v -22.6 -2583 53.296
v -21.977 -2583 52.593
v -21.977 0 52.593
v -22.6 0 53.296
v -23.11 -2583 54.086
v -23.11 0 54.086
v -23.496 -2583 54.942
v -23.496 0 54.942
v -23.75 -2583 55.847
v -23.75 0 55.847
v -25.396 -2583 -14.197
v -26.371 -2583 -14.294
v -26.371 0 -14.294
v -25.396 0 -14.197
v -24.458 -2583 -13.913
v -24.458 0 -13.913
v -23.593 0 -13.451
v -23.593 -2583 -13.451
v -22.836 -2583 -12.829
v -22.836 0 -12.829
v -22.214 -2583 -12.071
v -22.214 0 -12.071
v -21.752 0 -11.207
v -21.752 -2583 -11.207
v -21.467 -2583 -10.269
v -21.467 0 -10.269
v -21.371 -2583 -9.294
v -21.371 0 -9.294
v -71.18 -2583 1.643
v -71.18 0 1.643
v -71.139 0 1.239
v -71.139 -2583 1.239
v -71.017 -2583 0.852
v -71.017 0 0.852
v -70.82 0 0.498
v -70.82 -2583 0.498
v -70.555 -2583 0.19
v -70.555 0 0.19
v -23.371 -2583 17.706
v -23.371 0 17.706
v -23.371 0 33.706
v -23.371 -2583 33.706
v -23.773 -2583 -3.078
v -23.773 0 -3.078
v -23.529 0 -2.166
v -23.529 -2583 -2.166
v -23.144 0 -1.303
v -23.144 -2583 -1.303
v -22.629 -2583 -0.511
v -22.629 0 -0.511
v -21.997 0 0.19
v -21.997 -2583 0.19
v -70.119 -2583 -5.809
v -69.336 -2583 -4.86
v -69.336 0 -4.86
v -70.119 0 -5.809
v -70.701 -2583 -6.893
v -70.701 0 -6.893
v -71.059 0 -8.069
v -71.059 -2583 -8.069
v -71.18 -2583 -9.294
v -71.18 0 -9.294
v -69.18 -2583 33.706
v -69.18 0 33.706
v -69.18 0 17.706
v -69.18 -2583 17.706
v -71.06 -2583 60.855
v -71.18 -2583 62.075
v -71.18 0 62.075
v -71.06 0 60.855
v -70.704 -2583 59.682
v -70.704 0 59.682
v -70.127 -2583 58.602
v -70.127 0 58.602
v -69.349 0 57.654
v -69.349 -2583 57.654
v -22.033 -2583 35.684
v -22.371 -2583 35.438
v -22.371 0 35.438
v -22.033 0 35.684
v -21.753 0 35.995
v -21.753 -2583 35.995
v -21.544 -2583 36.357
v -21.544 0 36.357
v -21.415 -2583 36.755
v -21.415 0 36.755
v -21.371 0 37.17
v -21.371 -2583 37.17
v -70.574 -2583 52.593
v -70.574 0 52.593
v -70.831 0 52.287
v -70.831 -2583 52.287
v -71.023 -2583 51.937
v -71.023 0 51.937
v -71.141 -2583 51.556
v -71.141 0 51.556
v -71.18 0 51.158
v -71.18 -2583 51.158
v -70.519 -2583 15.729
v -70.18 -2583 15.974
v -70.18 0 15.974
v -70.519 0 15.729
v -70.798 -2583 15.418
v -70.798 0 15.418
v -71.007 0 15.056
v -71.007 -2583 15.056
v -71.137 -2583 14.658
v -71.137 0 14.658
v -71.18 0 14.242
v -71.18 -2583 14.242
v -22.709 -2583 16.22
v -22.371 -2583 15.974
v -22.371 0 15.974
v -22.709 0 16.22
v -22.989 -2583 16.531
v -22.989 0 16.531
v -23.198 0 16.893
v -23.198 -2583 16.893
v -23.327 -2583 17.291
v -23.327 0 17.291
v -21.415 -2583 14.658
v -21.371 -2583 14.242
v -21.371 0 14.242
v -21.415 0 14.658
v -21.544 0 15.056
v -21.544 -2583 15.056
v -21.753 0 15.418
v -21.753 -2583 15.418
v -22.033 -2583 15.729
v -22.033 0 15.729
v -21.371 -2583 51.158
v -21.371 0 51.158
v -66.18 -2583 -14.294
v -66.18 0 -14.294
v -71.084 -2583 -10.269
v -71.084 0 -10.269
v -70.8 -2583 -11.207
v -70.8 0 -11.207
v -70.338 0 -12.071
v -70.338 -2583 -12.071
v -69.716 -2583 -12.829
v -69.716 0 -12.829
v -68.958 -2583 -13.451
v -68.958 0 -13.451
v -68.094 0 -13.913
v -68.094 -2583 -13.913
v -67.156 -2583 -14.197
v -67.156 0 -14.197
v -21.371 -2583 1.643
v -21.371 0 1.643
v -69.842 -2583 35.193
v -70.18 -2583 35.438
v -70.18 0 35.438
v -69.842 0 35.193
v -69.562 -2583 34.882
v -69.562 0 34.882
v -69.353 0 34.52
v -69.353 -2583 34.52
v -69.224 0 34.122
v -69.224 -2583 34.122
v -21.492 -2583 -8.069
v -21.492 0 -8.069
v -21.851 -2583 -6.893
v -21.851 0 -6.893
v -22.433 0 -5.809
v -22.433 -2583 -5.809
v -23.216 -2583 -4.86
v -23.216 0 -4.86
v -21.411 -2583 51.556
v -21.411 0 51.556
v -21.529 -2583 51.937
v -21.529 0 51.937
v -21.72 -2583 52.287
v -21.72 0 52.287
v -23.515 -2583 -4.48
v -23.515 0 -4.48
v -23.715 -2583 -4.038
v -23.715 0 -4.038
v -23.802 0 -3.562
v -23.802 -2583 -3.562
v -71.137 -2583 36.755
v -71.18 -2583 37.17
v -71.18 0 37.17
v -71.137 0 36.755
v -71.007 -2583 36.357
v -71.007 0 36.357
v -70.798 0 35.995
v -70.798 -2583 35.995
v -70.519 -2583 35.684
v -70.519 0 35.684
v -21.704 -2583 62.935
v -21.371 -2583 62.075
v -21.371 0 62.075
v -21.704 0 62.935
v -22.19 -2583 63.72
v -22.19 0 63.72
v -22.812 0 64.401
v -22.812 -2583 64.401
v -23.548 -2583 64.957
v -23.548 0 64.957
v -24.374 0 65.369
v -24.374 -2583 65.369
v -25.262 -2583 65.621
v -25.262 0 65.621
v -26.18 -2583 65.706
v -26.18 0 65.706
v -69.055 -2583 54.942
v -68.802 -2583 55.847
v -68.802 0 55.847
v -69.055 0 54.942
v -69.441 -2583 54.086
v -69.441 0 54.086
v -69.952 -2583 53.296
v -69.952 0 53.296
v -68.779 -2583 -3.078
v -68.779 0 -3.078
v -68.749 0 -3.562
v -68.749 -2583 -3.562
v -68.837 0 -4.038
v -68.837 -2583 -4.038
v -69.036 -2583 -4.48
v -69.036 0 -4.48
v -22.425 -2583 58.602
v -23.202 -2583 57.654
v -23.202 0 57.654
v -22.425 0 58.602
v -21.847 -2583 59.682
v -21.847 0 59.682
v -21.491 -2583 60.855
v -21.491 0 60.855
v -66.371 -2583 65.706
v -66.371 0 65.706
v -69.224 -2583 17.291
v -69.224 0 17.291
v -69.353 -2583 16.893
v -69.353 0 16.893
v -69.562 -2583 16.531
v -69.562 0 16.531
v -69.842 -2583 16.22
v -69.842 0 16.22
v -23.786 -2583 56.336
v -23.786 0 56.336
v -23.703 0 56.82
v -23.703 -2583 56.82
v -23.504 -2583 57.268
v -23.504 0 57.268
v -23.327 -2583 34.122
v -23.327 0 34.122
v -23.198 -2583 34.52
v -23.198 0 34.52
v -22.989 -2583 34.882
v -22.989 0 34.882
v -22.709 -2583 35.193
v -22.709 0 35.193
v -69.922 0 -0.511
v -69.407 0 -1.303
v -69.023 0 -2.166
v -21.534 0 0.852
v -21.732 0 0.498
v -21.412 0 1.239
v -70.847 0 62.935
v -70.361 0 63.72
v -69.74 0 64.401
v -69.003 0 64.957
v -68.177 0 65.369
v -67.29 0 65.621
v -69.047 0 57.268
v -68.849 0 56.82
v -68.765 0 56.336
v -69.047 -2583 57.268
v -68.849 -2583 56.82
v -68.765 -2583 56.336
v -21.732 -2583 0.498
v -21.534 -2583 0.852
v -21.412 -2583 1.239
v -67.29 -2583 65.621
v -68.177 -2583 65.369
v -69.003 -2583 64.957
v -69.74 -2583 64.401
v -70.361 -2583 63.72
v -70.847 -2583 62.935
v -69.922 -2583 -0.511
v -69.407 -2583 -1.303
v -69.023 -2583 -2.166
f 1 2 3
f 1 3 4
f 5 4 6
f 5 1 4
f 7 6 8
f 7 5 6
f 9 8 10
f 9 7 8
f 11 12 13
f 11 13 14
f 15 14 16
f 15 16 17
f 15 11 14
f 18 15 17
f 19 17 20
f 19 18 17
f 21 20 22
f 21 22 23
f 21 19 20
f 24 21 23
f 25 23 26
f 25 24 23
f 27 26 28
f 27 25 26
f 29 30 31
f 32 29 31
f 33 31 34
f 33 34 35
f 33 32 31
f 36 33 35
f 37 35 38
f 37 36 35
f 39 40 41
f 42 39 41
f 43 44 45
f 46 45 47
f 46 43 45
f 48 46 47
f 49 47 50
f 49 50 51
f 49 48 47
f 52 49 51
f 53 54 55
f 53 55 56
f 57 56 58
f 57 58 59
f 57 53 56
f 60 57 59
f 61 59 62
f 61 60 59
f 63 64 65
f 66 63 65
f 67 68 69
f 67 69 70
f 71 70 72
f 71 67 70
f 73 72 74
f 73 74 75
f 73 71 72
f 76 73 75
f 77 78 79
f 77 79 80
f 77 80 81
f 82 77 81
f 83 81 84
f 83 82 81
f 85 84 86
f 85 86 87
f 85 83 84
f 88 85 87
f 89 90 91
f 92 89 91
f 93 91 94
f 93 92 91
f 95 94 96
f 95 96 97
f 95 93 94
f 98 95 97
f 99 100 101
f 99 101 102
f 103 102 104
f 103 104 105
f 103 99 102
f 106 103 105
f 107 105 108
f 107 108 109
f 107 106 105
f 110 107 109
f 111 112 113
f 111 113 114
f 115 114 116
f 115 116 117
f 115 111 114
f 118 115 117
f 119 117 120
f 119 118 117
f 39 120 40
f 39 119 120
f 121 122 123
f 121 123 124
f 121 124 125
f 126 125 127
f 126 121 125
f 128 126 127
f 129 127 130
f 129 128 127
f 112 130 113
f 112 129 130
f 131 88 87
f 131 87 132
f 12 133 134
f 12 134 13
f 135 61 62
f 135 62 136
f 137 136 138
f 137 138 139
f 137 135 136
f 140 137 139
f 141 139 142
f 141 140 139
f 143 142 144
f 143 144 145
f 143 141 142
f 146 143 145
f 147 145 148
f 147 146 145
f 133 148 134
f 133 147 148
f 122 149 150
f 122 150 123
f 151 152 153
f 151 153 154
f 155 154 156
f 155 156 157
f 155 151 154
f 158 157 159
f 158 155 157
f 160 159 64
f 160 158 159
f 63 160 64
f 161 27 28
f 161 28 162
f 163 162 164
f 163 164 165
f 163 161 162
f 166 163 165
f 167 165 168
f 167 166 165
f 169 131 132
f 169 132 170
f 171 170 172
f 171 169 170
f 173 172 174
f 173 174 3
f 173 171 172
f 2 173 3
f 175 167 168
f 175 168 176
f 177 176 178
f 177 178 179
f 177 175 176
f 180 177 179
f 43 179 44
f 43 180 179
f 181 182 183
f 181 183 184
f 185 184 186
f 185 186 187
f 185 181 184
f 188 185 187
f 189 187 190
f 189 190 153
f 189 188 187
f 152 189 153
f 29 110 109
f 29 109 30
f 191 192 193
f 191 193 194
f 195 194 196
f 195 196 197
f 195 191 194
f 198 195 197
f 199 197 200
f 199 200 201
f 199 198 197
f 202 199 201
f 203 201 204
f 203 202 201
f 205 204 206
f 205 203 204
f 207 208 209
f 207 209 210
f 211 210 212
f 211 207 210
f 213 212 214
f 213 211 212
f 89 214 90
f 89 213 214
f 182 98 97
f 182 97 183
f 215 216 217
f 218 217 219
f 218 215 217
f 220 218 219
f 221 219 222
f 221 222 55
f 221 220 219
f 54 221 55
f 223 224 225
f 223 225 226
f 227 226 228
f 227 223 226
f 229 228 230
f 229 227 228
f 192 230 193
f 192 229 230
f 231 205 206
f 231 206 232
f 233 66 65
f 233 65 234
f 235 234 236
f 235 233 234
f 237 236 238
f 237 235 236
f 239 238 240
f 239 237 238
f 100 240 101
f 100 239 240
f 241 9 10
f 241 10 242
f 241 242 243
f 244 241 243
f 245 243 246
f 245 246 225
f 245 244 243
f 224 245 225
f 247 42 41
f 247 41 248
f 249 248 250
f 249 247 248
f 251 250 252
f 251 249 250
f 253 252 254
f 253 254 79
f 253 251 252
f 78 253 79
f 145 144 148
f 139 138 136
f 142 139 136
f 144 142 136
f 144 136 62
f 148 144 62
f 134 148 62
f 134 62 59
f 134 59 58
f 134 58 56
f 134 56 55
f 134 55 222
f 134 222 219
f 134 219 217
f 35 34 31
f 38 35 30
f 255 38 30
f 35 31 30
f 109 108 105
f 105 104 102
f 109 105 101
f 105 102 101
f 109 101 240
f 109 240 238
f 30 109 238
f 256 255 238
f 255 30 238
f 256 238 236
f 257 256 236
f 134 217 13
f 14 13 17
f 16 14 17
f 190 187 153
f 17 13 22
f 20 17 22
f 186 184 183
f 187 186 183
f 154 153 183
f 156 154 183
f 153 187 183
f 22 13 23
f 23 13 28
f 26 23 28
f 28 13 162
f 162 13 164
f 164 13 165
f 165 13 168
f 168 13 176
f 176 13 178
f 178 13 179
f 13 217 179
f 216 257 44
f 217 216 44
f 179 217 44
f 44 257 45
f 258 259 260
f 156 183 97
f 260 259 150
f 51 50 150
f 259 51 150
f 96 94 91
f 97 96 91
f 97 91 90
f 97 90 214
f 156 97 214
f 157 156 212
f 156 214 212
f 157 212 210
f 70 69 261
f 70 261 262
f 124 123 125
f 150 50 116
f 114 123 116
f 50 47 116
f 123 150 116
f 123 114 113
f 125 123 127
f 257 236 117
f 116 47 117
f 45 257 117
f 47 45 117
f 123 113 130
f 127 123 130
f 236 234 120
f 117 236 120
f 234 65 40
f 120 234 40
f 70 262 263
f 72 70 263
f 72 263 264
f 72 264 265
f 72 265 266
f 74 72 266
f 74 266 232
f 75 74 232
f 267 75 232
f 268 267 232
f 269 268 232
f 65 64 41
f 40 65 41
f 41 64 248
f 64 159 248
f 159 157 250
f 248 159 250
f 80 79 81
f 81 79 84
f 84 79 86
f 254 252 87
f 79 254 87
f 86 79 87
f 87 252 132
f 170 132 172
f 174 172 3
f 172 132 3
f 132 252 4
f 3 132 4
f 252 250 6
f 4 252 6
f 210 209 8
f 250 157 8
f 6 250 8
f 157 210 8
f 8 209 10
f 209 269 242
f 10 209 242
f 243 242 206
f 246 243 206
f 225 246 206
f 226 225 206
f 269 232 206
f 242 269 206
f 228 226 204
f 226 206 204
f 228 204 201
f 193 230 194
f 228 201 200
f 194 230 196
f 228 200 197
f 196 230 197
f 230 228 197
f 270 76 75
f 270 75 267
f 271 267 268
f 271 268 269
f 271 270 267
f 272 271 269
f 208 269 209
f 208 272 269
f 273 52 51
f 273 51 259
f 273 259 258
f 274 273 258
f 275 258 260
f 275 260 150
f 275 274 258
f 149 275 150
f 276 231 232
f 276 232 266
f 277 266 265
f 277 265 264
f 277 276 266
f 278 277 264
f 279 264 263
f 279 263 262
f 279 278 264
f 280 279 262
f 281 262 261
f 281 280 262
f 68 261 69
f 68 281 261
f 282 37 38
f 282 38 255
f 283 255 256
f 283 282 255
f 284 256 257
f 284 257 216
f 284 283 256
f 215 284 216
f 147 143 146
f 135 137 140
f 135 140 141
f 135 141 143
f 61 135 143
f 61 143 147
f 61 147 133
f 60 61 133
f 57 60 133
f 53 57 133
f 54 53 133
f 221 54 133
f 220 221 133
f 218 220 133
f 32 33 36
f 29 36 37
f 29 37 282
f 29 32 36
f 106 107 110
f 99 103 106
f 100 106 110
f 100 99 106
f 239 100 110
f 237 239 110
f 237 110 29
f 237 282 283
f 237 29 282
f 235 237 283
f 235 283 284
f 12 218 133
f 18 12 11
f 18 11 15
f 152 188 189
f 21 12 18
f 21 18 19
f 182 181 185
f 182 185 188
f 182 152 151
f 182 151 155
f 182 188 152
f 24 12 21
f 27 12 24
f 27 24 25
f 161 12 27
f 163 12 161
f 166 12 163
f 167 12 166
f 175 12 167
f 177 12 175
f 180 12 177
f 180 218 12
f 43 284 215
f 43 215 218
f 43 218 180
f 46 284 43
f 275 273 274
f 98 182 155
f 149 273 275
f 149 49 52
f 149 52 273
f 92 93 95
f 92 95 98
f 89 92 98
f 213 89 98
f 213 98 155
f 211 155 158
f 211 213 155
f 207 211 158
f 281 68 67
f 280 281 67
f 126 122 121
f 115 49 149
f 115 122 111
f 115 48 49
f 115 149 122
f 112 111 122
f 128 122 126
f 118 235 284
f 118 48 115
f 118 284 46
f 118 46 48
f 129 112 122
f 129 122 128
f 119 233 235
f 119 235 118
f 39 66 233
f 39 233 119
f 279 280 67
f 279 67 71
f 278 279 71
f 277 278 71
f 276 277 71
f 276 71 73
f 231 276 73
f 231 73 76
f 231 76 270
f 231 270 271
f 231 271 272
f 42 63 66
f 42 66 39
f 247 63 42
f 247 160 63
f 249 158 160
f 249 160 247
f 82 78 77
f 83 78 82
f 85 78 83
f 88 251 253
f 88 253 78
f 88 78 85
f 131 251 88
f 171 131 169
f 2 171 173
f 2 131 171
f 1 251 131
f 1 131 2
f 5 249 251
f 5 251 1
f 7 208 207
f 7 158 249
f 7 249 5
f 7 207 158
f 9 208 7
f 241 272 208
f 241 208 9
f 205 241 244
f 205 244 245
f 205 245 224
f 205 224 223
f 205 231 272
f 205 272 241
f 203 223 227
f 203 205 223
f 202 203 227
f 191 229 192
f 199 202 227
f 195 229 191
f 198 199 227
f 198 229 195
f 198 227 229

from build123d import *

# Parameters (mm, degrees)
F1_DEPTH = 1364


# Not quite as in the source:
# - a feature of the source that left no trace in its solid (it failed there, or was rolled back) is left out
# - a pattern or mirror of a feature is missing from the dataset's text; its kind, count and spacing are read off the source's solid


with BuildPart() as f1:
    # F0 (on Front) → F1 (new body)
    with BuildSketch(Plane.XZ):
        with BuildLine():
            Line((-26.1803913116, 65.7064561546), (-66.3712014047, 65.7064561546))
            ThreePointArc((-66.3712014047, 65.7064561546), (-69.3844645404, 64.6964743594), (-71.1803913116, 62.0745542645))
            ThreePointArc((-71.1803913116, 62.0745542645), (-70.7044517023, 59.6823321584), (-69.349118798, 57.6544470937))
            ThreePointArc((-69.349118798, 57.6544470937), (-68.8489055801, 56.8195085607), (-68.802041246, 55.8473257839))
            ThreePointArc((-68.802041246, 55.8473257839), (-69.4413893704, 54.0856160437), (-70.5743109736, 52.592674024))
            ThreePointArc((-70.5743109736, 52.592674024), (-71.0226507022, 51.9369653038), (-71.1803913116, 51.1584536867))
            Line((-71.1803913116, 51.1584536867), (-71.1803913116, 37.1704536867))
            ThreePointArc((-71.1803913116, 37.1704536867), (-70.9124421192, 36.1704536867), (-70.1803913116, 35.4384028791))
            ThreePointArc((-70.1803913116, 35.4384028791), (-69.4483405041, 34.7063520715), (-69.1803913116, 33.7063520715))
            Line((-69.1803913116, 33.7063520715), (-69.1803913116, 17.7064561546))
            ThreePointArc((-69.1803913116, 17.7064561546), (-69.4483405041, 16.7064561546), (-70.1803913116, 15.974405347))
            ThreePointArc((-70.1803913116, 15.974405347), (-70.9124421192, 15.2423545394), (-71.1803913116, 14.2423545394))
            Line((-71.1803913116, 14.2423545394), (-71.1803913116, 1.6428347462))
            ThreePointArc((-71.1803913116, 1.6428347462), (-71.017419076, 0.8520572851), (-70.5550623187, 0.1901545948))
            ThreePointArc((-70.5550623187, 0.1901545948), (-69.4072427397, -1.3029633413), (-68.7788291433, -3.0783470488))
            ThreePointArc((-68.7788291433, -3.0783470488), (-68.8366723002, -4.0382506294), (-69.3358356782, -4.8601974871))
            ThreePointArc((-69.3358356782, -4.8601974871), (-70.7008560802, -6.8926614338), (-71.1803913116, -9.2935438454))
            ThreePointArc((-71.1803913116, -9.2935438454), (-69.7159252176, -12.8290777513), (-66.1803913116, -14.2935438454))
            Line((-66.1803913116, -14.2935438454), (-26.3712014047, -14.2935438454))
            ThreePointArc((-26.3712014047, -14.2935438454), (-22.8356674987, -12.8290777513), (-21.3712014047, -9.2935438454))
            ThreePointArc((-21.3712014047, -9.2935438454), (-21.8507366361, -6.8926614338), (-23.2157570381, -4.8601974871))
            ThreePointArc((-23.2157570381, -4.8601974871), (-23.7149204161, -4.0382506294), (-23.772763573, -3.0783470488))
            ThreePointArc((-23.772763573, -3.0783470488), (-23.1443499766, -1.3029633413), (-21.9965303976, 0.1901545948))
            ThreePointArc((-21.9965303976, 0.1901545948), (-21.5341736403, 0.8520572851), (-21.3712014047, 1.6428347462))
            Line((-21.3712014047, 1.6428347462), (-21.3712014047, 14.2423545394))
            ThreePointArc((-21.3712014047, 14.2423545394), (-21.6391505971, 15.2423545394), (-22.3712014047, 15.974405347))
            ThreePointArc((-22.3712014047, 15.974405347), (-23.1032522122, 16.7064561546), (-23.3712014047, 17.7064561546))
            Line((-23.3712014047, 17.7064561546), (-23.3712014047, 33.7063520715))
            ThreePointArc((-23.3712014047, 33.7063520715), (-23.1032522122, 34.7063520715), (-22.3712014047, 35.4384028791))
            ThreePointArc((-22.3712014047, 35.4384028791), (-21.6391505971, 36.1704536867), (-21.3712014047, 37.1704536867))
            Line((-21.3712014047, 37.1704536867), (-21.3712014047, 51.1584536867))
            ThreePointArc((-21.3712014047, 51.1584536867), (-21.5289420141, 51.9369653038), (-21.9772817427, 52.592674024))
            ThreePointArc((-21.9772817427, 52.592674024), (-23.1102033459, 54.0856160437), (-23.7495514703, 55.8473257839))
            ThreePointArc((-23.7495514703, 55.8473257839), (-23.7026871362, 56.8195085607), (-23.2024739183, 57.6544470937))
            ThreePointArc((-23.2024739183, 57.6544470937), (-21.847141014, 59.6823321584), (-21.3712014047, 62.0745542645))
            ThreePointArc((-21.3712014047, 62.0745542645), (-23.1671281759, 64.6964743594), (-26.1803913116, 65.7064561546))
        make_face()
    extrude(amount=F1_DEPTH)

    # F1_copies: F1 across plane


with BuildPart() as f1_1:
    add(f1.part)
    add(f1.part.mirror(Plane(origin=(0, -1291.5, 0), x_dir=(0, 0, -1), z_dir=(0, -1, 0))))


solid = f1_1.part
